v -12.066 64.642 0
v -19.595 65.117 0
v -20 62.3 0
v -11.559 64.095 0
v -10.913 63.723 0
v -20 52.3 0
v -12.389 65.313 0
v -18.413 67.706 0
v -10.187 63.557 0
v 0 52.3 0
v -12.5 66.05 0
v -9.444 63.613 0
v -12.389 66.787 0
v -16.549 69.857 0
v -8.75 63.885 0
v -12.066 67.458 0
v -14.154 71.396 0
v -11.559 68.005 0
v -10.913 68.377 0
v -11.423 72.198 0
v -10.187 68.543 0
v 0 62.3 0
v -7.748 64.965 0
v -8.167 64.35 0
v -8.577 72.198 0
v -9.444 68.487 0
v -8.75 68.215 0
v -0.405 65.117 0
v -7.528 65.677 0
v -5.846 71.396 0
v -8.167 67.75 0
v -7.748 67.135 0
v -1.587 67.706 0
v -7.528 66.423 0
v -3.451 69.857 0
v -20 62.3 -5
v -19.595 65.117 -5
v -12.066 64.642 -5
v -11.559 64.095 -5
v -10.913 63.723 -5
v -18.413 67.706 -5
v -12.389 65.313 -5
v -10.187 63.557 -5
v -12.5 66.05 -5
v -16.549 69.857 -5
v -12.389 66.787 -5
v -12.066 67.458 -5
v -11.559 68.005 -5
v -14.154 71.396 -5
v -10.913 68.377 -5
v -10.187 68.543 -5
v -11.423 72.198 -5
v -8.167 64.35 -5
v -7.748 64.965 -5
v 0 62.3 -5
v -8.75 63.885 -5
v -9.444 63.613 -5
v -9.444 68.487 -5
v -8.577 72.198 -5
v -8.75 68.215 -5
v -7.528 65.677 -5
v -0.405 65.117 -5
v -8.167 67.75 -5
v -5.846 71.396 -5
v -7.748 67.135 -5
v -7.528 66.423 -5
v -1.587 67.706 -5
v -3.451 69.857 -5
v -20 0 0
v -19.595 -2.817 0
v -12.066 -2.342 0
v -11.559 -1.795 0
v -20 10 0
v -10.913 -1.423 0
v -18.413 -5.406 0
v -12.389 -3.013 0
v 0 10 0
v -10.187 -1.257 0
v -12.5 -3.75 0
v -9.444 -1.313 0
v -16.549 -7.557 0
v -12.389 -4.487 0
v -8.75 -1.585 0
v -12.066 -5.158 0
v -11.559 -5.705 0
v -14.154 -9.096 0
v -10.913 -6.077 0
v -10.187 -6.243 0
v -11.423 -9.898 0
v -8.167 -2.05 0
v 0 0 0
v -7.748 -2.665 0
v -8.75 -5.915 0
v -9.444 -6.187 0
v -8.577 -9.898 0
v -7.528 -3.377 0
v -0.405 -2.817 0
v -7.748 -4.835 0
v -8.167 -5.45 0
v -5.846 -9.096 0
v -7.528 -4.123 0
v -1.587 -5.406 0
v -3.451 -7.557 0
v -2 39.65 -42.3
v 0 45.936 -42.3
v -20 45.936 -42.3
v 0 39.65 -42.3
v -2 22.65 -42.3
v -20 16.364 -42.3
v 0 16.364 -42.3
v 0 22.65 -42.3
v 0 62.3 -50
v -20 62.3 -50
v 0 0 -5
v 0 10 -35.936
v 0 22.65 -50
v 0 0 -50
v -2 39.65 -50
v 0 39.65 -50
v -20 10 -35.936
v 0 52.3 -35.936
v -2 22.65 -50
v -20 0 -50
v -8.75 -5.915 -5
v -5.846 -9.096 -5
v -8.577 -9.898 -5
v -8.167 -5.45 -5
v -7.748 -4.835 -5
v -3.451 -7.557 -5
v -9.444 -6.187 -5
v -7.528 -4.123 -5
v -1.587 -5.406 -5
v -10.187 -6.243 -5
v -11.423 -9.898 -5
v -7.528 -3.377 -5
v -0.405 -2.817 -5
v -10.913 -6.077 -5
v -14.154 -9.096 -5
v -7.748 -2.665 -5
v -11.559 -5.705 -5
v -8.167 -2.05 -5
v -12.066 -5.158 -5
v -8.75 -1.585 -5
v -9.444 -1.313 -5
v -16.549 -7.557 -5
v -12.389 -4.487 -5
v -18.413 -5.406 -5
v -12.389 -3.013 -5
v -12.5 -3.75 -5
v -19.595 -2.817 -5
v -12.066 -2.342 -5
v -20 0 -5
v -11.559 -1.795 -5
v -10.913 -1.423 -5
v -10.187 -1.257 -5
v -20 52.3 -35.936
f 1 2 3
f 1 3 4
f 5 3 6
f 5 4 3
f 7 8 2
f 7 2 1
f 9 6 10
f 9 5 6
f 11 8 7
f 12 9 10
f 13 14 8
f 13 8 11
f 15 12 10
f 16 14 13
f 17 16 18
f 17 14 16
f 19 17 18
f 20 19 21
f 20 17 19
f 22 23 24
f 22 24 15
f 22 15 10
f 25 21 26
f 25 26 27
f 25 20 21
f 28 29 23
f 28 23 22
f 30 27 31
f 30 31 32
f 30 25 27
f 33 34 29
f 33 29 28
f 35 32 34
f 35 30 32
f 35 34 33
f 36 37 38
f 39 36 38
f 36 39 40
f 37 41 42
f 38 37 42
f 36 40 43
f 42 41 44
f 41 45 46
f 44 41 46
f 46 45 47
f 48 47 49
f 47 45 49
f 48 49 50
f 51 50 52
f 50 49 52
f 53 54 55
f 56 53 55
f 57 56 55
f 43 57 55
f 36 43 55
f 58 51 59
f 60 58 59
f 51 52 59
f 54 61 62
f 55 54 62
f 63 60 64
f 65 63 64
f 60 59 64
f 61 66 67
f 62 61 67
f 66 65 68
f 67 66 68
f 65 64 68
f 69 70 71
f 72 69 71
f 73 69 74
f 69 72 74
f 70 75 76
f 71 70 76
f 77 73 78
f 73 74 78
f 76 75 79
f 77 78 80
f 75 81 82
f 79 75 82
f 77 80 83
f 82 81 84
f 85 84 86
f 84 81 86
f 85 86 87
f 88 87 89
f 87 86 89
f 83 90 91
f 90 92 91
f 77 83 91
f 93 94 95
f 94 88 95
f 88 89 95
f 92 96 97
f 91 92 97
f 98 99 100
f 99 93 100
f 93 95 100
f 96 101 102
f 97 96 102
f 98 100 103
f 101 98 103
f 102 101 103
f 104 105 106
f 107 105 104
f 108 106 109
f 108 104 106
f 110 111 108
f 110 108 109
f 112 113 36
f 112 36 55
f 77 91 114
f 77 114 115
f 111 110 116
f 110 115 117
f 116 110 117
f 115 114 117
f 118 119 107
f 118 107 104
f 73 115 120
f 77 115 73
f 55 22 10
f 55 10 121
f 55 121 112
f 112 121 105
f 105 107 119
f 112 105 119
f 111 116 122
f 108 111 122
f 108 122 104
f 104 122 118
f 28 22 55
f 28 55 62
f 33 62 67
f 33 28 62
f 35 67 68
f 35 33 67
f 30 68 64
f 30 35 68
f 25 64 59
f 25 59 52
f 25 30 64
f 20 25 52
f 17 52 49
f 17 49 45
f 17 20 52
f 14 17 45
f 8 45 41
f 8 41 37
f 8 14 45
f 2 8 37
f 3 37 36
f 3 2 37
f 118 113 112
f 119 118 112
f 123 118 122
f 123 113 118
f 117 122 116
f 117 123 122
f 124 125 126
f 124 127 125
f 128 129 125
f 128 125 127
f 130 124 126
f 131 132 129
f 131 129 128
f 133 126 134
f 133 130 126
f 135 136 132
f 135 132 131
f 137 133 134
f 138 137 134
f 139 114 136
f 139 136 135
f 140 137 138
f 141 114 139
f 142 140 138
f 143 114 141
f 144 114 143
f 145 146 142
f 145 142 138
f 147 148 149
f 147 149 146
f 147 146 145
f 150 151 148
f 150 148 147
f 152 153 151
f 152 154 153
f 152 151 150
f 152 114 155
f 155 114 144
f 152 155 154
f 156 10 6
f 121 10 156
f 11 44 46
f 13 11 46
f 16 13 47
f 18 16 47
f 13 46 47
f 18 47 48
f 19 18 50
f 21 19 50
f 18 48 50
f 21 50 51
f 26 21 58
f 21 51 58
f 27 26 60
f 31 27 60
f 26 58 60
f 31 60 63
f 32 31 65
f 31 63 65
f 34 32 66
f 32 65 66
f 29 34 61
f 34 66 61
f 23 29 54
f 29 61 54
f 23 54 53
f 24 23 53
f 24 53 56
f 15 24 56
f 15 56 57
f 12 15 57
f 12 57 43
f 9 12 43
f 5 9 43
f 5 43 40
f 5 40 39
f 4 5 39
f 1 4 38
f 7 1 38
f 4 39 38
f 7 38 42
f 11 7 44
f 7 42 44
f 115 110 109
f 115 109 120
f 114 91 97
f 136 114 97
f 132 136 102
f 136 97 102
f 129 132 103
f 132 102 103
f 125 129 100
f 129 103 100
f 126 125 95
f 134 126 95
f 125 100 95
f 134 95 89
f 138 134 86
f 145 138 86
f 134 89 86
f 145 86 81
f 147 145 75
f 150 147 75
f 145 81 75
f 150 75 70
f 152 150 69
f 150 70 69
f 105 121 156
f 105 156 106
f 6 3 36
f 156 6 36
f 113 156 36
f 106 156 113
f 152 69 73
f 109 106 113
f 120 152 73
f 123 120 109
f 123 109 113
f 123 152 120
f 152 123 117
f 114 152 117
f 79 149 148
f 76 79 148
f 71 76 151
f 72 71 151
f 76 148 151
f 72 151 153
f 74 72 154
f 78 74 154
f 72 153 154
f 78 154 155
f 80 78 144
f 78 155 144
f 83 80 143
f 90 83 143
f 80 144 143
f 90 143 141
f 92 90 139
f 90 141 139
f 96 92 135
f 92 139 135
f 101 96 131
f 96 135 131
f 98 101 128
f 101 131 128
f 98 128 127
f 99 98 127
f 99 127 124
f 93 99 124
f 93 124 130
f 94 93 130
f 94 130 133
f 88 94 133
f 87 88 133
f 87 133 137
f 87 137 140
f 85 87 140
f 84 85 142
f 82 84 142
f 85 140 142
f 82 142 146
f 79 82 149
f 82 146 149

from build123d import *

# Parameters (mm, degrees)
SKETCH1_W               = 20
SKETCH1_H               = 50
BOSS_EXTRUDE2_DEPTH     = 62.3
CUT_EXTRUDE1_DEPTH      = 1
CUT_EXTRUDE1_DEPTH_BACK = 21
BOSS_EXTRUDE3_DEPTH     = 5
SKETCH6_R               = 2.5
CUT_EXTRUDE2_DEPTH      = 5
SKETCH7_W               = 2
SKETCH7_H               = 17
CUT_EXTRUDE3_DEPTH      = 10


with BuildPart() as part:
    # Sketch1 → Boss-Extrude2 (new body)
    with BuildSketch(Plane(origin=(0, 0, 0), x_dir=(1, 0, 0), z_dir=(0, 1, 0))):
        with Locations((-10, 25)):
            Rectangle(SKETCH1_W, SKETCH1_H)
    extrude(amount=BOSS_EXTRUDE2_DEPTH)

    # Sketch2 → Cut-Extrude1 (cut, two sides)
    with BuildSketch(Plane(origin=(0, 0, 0), x_dir=(0, 0, -1), z_dir=(1, 0, 0))) as cut_extrude1_sk:
        Polygon((0, 52.3), (35.936038969, 52.3), (42.3, 45.936038969), (42.3, 16.363961031), (35.936038969, 10), (0, 10), align=None)
    extrude(amount=CUT_EXTRUDE1_DEPTH, mode=Mode.SUBTRACT)
    extrude(cut_extrude1_sk.sketch, amount=-CUT_EXTRUDE1_DEPTH_BACK, mode=Mode.SUBTRACT)

    # Sketch5 → Boss-Extrude3 (add)
    with BuildSketch(Plane.XY):
        with BuildLine():
            Line((-20, 62.3), (0, 62.3))
            ThreePointArc((0, 62.3), (-10, 72.3), (-20, 62.3))
        make_face()
        with BuildLine():
            Line((-20, 0), (0, 0))
            ThreePointArc((0, 0), (-10, -10), (-20, 0))
        make_face()
    extrude(amount=-BOSS_EXTRUDE3_DEPTH)

    # Sketch6 → Cut-Extrude2 (cut)
    with BuildSketch(Plane(origin=(0, 0, -5), x_dir=(-1, 0, 0), z_dir=(0, 0, -1))):
        with Locations((10, 66.05)):
            Circle(SKETCH6_R)
        with Locations((10, -3.75)):
            Circle(SKETCH6_R)
    extrude(amount=-CUT_EXTRUDE2_DEPTH, mode=Mode.SUBTRACT)

    # Sketch7 → Cut-Extrude3 (cut)
    with BuildSketch(Plane(origin=(0, 0, -50), x_dir=(-1, 0, 0), z_dir=(0, 0, -1))):
        with Locations((1, 31.15)):
            Rectangle(SKETCH7_W, SKETCH7_H)
    extrude(amount=-CUT_EXTRUDE3_DEPTH, mode=Mode.SUBTRACT)


solid = part.part
